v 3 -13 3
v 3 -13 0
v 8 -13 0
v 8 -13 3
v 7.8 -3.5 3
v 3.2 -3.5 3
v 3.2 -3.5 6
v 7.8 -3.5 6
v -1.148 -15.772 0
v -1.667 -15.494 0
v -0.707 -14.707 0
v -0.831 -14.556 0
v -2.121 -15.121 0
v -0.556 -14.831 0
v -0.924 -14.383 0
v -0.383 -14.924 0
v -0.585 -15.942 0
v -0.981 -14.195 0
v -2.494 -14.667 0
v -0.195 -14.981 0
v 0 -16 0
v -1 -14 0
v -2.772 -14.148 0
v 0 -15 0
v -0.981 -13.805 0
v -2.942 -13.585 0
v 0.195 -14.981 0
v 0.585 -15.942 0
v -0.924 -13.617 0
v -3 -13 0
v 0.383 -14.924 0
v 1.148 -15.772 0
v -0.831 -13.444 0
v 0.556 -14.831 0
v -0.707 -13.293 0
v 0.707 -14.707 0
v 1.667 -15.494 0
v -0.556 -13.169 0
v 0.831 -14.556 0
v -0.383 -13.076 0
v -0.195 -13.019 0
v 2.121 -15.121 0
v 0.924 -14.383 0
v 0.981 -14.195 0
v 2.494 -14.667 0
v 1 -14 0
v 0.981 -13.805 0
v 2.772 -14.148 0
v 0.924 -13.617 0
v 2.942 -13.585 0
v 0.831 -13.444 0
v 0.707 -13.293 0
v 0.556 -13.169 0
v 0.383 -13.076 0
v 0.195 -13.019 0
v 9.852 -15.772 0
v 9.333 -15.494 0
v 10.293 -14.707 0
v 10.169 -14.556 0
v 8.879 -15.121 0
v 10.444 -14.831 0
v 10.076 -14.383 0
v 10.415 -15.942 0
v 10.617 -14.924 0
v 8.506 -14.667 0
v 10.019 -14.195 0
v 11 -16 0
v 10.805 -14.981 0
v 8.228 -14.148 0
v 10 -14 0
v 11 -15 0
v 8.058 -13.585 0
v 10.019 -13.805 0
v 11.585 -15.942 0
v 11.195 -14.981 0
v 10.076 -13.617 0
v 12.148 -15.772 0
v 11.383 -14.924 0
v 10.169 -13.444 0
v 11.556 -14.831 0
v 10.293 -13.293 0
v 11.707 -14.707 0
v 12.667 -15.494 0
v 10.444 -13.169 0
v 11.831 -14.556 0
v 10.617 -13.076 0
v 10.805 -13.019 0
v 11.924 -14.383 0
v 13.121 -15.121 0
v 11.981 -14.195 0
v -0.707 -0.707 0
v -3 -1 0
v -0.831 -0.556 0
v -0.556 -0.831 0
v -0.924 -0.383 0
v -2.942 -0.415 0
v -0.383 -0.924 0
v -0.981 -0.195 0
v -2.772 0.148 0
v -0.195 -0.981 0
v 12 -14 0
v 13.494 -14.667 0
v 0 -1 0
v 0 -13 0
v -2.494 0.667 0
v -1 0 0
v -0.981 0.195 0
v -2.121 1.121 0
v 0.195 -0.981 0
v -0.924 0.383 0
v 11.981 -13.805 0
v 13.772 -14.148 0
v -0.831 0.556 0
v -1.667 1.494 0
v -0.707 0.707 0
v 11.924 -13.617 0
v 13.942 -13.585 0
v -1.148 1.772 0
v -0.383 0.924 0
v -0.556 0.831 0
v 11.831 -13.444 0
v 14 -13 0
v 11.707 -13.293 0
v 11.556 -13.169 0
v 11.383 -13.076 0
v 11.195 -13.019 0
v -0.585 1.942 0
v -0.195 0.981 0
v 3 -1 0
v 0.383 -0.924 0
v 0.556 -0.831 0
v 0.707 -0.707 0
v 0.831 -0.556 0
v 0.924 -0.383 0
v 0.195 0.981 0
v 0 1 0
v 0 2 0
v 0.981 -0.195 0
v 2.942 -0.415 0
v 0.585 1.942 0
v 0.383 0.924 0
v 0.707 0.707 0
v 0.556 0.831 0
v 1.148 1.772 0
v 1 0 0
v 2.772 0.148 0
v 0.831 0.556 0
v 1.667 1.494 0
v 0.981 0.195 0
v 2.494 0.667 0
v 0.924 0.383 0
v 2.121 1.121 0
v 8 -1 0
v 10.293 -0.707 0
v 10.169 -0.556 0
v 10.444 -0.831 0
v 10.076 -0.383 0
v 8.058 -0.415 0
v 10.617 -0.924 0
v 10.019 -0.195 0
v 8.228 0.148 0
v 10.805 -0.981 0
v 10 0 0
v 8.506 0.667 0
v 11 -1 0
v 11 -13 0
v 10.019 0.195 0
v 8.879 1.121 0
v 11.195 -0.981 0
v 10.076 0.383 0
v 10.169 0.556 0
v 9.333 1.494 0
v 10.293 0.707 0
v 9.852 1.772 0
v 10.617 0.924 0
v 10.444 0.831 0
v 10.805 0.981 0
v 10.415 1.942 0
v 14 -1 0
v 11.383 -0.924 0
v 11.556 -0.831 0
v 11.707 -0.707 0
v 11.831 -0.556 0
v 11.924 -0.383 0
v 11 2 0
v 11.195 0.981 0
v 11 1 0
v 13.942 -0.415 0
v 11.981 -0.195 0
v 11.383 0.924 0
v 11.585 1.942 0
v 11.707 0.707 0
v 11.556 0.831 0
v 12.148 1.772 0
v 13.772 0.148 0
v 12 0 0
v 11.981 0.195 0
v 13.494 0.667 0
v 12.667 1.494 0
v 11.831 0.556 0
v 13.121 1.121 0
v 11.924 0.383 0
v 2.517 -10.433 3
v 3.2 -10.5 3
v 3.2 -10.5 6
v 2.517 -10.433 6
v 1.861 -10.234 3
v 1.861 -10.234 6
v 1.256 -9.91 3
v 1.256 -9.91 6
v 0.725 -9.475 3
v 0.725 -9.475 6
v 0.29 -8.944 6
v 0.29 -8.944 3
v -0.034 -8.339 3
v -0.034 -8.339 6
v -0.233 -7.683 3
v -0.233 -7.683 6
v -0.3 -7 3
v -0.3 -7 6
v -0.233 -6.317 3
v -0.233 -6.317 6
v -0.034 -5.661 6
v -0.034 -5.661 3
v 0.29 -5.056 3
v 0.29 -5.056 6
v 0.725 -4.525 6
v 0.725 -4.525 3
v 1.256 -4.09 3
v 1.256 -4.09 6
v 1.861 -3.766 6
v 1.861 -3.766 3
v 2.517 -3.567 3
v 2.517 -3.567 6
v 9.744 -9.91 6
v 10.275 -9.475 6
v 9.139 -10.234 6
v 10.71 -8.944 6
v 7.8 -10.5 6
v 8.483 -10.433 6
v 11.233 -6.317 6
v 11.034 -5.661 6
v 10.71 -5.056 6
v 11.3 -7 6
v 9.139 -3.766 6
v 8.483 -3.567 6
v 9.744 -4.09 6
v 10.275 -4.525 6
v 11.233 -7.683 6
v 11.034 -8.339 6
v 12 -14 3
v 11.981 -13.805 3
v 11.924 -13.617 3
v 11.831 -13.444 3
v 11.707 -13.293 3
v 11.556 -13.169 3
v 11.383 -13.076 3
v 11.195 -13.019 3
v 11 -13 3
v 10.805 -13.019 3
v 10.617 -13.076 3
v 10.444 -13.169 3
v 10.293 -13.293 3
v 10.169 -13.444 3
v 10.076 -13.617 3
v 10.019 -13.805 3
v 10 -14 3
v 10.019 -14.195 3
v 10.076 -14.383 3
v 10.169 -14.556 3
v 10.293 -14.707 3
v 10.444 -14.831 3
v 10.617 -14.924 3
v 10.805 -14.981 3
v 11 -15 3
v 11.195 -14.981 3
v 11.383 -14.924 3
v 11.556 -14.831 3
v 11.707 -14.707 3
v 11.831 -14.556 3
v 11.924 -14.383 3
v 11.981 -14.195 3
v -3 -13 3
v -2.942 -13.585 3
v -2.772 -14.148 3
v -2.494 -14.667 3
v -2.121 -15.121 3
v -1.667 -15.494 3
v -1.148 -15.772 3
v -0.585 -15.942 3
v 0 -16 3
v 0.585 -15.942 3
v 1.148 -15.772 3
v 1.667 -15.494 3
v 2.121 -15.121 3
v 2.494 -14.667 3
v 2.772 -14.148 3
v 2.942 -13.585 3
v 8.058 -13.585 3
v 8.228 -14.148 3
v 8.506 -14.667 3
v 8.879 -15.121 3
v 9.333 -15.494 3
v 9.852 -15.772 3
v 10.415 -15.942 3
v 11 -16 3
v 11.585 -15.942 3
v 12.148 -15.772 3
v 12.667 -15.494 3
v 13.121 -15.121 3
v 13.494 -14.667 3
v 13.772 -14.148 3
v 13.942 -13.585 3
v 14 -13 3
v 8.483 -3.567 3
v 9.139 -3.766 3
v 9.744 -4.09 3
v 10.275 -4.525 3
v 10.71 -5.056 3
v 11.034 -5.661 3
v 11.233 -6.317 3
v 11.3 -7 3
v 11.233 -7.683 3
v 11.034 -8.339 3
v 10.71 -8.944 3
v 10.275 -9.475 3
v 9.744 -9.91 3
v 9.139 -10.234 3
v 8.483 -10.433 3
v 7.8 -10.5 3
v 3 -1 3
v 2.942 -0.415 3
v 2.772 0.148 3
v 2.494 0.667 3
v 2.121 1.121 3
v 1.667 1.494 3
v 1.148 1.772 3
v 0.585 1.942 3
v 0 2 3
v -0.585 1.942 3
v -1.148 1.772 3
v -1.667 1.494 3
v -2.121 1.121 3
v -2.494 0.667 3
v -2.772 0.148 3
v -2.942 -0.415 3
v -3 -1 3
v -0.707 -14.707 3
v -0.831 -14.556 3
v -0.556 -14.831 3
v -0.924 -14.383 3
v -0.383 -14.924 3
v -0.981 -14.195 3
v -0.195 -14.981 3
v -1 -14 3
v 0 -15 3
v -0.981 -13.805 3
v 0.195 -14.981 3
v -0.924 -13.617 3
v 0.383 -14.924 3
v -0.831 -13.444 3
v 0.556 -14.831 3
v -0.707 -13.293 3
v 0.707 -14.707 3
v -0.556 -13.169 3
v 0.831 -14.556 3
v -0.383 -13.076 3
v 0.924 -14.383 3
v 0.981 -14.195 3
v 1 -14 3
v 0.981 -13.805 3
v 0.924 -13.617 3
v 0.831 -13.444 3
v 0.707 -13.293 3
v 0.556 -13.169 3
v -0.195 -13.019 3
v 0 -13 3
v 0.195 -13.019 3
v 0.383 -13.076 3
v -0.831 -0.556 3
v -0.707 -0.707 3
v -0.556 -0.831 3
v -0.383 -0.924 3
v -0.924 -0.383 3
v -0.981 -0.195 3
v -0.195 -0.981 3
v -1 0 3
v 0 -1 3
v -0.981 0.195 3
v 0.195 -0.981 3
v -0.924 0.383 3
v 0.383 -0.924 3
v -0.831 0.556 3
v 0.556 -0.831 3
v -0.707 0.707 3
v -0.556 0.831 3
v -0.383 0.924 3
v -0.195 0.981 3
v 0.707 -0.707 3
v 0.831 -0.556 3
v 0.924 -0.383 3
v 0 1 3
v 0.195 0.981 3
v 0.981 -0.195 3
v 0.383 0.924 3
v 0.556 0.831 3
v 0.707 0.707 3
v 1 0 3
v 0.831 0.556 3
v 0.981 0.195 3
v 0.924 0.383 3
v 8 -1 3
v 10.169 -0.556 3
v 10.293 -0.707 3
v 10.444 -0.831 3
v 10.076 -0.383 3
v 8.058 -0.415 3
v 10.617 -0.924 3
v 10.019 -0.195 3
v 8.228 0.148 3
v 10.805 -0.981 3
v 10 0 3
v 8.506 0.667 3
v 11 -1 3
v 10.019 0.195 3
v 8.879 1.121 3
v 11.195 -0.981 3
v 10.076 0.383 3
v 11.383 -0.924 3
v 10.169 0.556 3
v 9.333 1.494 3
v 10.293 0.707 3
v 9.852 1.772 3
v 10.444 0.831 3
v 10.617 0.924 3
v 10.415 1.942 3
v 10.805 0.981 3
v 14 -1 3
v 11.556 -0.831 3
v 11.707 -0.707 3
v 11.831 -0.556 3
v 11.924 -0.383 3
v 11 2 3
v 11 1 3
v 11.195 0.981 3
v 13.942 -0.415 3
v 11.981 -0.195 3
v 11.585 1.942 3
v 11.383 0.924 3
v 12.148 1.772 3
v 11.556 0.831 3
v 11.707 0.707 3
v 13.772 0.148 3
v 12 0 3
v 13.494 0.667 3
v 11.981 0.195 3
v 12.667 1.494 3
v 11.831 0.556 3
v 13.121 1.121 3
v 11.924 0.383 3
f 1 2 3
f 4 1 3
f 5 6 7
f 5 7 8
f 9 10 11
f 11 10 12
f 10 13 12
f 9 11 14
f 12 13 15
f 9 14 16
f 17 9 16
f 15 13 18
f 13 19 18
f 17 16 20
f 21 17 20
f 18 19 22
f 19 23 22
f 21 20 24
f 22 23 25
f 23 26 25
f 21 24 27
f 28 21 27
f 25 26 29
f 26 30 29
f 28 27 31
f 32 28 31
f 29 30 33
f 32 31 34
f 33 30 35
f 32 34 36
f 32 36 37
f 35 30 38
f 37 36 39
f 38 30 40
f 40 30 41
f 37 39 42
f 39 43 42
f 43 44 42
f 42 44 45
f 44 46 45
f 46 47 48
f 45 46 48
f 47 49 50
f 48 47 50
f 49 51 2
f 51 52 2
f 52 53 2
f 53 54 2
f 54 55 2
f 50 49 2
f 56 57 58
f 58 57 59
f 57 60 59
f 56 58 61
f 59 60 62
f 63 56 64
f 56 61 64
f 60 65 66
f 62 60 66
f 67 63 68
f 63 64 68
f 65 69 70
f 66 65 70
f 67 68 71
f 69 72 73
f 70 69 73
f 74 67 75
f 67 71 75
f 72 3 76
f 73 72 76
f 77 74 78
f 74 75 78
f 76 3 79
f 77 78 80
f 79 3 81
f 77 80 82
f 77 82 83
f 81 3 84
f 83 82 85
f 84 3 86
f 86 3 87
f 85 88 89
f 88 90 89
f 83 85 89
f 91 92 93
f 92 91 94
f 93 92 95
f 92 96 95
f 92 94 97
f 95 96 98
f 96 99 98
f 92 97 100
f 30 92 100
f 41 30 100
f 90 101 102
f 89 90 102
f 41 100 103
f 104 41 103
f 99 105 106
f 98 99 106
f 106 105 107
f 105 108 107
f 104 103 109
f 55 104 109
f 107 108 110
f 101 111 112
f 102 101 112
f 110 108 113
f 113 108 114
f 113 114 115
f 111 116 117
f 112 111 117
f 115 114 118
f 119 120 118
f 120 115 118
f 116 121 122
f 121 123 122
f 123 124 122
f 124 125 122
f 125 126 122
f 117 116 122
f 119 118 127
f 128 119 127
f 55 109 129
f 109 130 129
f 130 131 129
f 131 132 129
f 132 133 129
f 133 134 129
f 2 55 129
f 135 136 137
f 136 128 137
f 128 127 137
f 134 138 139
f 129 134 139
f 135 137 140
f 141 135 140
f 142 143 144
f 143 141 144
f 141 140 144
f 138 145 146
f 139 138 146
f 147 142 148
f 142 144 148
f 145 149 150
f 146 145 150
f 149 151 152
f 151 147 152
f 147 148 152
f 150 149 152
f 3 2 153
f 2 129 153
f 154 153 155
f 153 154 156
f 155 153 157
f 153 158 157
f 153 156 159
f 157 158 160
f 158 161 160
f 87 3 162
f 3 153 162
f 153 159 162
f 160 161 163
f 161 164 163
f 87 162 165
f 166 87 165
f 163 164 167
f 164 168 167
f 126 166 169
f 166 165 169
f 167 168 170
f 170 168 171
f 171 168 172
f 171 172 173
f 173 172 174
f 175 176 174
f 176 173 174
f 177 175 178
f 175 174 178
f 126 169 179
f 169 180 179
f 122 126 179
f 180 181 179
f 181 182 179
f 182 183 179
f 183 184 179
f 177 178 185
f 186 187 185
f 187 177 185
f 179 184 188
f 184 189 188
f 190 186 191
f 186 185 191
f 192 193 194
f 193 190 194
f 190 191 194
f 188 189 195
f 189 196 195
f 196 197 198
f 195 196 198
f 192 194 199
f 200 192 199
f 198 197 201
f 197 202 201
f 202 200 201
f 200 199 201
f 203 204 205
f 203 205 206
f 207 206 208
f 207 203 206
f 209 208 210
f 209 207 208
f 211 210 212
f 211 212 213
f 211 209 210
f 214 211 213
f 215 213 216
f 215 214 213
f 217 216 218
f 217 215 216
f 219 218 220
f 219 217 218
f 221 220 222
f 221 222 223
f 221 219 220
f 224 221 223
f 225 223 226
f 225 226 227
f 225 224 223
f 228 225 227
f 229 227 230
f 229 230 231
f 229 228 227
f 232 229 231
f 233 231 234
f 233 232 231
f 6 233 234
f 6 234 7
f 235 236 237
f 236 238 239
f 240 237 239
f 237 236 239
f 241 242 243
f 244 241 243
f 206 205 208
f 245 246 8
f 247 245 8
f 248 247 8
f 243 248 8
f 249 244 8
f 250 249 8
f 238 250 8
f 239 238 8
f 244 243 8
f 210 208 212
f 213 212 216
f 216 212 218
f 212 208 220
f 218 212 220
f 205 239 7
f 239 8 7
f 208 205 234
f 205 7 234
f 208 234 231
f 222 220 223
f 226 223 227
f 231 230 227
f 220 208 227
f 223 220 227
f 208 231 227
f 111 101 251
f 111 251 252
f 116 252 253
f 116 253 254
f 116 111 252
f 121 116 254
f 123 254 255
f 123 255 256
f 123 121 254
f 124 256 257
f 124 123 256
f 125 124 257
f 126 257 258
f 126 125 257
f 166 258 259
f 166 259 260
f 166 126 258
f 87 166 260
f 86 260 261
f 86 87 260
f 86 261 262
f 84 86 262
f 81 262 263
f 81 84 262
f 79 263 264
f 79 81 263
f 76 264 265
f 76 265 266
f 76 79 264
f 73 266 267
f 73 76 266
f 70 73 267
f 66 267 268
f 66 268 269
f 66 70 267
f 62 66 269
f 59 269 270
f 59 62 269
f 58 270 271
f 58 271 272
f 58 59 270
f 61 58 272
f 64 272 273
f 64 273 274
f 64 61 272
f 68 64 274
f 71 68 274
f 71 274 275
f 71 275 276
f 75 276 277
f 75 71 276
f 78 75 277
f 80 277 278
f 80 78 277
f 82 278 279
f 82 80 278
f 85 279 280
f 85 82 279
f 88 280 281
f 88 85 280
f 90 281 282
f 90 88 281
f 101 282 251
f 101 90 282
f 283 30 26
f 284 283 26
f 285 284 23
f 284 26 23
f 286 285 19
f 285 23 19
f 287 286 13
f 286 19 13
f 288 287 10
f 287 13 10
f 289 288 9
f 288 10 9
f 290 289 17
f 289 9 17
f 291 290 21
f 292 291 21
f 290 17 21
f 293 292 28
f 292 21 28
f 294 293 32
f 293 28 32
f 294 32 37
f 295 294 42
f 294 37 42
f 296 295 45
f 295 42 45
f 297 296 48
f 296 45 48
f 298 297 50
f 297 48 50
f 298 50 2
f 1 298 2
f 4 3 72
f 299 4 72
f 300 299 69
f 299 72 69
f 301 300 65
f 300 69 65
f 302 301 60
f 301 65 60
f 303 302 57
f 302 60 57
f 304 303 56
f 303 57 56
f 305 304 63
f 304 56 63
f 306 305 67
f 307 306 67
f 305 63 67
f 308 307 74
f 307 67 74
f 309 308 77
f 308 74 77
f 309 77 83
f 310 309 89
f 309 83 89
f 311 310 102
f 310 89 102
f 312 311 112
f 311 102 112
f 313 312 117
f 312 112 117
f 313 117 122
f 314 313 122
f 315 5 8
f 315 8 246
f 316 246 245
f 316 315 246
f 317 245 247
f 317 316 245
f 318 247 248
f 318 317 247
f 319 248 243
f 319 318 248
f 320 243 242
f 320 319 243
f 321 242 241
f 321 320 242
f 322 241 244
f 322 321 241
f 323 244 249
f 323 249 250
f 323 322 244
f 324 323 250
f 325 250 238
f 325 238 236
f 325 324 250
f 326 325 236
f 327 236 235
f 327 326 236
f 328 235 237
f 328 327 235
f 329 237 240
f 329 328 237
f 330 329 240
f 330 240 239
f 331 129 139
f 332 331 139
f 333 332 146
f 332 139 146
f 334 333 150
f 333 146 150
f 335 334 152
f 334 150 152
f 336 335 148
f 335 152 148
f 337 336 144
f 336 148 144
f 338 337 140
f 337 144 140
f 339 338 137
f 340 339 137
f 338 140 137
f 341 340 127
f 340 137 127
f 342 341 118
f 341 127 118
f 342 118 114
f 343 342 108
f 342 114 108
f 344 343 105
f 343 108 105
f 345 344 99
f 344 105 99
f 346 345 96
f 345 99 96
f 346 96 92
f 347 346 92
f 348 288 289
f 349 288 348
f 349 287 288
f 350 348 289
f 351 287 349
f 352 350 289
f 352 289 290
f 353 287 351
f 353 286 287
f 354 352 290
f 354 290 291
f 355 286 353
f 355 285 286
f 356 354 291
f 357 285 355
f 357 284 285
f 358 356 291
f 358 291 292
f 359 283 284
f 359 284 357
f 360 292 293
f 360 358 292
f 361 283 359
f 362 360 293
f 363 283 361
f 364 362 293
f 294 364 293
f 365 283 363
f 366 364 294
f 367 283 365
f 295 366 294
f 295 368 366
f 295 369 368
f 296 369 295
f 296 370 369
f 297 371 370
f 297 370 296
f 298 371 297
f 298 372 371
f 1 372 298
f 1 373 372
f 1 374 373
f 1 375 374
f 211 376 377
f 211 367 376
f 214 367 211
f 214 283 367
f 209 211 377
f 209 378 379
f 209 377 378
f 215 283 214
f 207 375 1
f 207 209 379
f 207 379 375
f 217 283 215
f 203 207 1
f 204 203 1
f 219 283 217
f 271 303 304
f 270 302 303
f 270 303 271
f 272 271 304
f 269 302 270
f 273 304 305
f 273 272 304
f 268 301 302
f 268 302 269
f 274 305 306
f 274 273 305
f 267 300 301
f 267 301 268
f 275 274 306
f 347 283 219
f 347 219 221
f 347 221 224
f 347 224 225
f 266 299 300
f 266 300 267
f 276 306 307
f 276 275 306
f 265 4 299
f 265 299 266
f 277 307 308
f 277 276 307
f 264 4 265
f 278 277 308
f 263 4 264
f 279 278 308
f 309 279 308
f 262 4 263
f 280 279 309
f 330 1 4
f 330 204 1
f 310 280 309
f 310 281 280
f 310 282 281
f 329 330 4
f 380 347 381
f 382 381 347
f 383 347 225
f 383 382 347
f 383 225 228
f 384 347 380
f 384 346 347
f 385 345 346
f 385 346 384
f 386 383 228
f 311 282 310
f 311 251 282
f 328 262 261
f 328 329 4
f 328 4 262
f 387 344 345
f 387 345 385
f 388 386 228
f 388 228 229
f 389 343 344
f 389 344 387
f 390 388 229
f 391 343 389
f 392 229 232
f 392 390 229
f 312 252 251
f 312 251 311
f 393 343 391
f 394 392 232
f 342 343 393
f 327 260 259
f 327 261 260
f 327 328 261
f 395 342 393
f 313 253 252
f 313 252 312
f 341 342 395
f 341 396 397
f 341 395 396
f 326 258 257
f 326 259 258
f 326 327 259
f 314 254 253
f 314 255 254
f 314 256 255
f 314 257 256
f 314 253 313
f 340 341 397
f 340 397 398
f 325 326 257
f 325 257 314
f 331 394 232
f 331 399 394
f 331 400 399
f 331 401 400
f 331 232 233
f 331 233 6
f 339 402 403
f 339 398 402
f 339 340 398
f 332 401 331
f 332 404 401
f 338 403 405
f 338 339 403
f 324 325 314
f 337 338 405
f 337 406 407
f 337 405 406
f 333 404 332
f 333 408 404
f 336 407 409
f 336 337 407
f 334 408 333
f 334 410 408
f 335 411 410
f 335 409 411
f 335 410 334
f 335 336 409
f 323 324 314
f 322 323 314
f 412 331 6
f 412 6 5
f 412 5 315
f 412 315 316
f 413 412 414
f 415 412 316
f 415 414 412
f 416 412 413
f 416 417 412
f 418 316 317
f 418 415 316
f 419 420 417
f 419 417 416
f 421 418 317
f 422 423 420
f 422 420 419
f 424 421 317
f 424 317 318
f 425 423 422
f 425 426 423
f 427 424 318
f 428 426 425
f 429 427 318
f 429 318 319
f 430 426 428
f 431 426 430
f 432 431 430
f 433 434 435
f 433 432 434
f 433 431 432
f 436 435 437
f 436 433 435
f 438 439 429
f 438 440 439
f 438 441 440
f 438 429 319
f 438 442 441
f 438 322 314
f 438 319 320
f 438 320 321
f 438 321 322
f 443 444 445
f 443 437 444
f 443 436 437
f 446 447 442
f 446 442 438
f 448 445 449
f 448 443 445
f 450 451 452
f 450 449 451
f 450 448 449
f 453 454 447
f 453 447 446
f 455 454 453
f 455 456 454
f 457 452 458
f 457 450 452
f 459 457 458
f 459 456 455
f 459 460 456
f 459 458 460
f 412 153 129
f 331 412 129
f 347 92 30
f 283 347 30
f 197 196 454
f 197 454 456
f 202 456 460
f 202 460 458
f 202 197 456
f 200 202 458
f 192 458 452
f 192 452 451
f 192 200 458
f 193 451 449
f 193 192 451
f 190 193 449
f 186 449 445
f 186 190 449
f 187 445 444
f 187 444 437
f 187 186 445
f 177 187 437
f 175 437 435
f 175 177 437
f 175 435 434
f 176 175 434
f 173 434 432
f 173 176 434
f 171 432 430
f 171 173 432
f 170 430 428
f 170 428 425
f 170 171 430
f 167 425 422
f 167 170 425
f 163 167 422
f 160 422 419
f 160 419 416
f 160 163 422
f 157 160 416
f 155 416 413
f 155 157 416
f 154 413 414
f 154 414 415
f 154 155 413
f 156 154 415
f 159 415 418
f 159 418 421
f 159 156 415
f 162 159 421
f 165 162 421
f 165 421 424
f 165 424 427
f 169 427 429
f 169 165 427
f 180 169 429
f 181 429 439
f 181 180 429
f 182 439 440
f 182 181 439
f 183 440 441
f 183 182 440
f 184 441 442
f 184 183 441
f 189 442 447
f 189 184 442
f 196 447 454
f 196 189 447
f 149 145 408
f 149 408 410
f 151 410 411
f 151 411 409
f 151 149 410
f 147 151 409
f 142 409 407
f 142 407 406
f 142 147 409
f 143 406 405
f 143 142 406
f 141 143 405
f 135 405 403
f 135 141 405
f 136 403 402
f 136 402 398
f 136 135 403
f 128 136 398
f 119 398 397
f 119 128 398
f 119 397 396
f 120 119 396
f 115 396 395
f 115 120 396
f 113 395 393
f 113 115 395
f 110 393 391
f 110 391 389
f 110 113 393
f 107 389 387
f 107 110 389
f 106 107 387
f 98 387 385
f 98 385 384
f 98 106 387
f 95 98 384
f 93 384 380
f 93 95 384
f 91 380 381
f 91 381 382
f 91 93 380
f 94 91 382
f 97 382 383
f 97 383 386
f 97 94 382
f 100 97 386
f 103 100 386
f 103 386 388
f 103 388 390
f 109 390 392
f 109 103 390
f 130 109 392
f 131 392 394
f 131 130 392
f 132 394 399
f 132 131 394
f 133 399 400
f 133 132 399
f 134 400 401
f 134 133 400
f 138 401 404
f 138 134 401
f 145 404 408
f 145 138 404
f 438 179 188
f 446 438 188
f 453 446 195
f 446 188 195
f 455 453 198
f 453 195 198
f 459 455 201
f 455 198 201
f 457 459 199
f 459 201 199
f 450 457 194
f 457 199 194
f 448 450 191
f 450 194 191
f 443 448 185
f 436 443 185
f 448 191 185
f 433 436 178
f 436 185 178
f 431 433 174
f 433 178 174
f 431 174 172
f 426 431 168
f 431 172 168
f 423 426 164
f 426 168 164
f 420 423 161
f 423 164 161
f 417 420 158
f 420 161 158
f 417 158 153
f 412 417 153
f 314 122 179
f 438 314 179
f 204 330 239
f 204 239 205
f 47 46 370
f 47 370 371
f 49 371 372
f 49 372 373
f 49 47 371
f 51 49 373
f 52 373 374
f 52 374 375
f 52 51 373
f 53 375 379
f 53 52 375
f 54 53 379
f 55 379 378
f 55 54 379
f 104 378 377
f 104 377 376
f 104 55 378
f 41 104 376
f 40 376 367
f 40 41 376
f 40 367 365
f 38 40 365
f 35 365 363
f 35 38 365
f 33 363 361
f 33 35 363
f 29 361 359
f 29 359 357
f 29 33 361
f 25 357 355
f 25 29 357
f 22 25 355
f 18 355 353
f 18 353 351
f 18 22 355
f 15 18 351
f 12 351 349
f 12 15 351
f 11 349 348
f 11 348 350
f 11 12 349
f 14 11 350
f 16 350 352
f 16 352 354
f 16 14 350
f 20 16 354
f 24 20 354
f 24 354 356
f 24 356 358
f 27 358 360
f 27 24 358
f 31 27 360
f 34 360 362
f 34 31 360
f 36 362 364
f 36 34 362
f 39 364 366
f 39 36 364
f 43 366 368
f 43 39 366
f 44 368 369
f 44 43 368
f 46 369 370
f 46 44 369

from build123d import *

# Parameters (mm, degrees)
SKETCH_1_R      = 1
EXTRUDE_1_DEPTH = 3
EXTRUDE_2_DEPTH = 3


with BuildPart() as part:
    # 草图1 → 凸台-拉伸1 (new body)
    with BuildSketch(Plane.XY):
        with BuildLine():
            Line((3, -13), (8, -13))
            ThreePointArc((8, -13), (11, -16), (14, -13))
            Line((14, -13), (14, -1))
            ThreePointArc((14, -1), (11, 2), (8, -1))
            Line((8, -1), (3, -1))
            ThreePointArc((3, -1), (0, 2), (-3, -1))
            Line((-3, -1), (-3, -13))
            ThreePointArc((-3, -13), (0, -16), (3, -13))
        make_face()
        with Locations((11, -14)):
            Circle(SKETCH_1_R, mode=Mode.SUBTRACT)
        Circle(SKETCH_1_R, mode=Mode.SUBTRACT)
        with Locations((11, 0)):
            Circle(SKETCH_1_R, mode=Mode.SUBTRACT)
        with Locations((0, -14)):
            Circle(SKETCH_1_R, mode=Mode.SUBTRACT)
    extrude(amount=EXTRUDE_1_DEPTH)

    # 草图2 → 凸台-拉伸2 (add)
    with BuildSketch(Plane.XY.offset(3)):
        with BuildLine():
            Line((3.2, -3.5), (7.8, -3.5))
            ThreePointArc((7.8, -3.5), (11.3, -7), (7.8, -10.5))
            Line((7.8, -10.5), (3.2, -10.5))
            ThreePointArc((3.2, -10.5), (-0.3, -7), (3.2, -3.5))
        make_face()
    extrude(amount=EXTRUDE_2_DEPTH)


solid = part.part
